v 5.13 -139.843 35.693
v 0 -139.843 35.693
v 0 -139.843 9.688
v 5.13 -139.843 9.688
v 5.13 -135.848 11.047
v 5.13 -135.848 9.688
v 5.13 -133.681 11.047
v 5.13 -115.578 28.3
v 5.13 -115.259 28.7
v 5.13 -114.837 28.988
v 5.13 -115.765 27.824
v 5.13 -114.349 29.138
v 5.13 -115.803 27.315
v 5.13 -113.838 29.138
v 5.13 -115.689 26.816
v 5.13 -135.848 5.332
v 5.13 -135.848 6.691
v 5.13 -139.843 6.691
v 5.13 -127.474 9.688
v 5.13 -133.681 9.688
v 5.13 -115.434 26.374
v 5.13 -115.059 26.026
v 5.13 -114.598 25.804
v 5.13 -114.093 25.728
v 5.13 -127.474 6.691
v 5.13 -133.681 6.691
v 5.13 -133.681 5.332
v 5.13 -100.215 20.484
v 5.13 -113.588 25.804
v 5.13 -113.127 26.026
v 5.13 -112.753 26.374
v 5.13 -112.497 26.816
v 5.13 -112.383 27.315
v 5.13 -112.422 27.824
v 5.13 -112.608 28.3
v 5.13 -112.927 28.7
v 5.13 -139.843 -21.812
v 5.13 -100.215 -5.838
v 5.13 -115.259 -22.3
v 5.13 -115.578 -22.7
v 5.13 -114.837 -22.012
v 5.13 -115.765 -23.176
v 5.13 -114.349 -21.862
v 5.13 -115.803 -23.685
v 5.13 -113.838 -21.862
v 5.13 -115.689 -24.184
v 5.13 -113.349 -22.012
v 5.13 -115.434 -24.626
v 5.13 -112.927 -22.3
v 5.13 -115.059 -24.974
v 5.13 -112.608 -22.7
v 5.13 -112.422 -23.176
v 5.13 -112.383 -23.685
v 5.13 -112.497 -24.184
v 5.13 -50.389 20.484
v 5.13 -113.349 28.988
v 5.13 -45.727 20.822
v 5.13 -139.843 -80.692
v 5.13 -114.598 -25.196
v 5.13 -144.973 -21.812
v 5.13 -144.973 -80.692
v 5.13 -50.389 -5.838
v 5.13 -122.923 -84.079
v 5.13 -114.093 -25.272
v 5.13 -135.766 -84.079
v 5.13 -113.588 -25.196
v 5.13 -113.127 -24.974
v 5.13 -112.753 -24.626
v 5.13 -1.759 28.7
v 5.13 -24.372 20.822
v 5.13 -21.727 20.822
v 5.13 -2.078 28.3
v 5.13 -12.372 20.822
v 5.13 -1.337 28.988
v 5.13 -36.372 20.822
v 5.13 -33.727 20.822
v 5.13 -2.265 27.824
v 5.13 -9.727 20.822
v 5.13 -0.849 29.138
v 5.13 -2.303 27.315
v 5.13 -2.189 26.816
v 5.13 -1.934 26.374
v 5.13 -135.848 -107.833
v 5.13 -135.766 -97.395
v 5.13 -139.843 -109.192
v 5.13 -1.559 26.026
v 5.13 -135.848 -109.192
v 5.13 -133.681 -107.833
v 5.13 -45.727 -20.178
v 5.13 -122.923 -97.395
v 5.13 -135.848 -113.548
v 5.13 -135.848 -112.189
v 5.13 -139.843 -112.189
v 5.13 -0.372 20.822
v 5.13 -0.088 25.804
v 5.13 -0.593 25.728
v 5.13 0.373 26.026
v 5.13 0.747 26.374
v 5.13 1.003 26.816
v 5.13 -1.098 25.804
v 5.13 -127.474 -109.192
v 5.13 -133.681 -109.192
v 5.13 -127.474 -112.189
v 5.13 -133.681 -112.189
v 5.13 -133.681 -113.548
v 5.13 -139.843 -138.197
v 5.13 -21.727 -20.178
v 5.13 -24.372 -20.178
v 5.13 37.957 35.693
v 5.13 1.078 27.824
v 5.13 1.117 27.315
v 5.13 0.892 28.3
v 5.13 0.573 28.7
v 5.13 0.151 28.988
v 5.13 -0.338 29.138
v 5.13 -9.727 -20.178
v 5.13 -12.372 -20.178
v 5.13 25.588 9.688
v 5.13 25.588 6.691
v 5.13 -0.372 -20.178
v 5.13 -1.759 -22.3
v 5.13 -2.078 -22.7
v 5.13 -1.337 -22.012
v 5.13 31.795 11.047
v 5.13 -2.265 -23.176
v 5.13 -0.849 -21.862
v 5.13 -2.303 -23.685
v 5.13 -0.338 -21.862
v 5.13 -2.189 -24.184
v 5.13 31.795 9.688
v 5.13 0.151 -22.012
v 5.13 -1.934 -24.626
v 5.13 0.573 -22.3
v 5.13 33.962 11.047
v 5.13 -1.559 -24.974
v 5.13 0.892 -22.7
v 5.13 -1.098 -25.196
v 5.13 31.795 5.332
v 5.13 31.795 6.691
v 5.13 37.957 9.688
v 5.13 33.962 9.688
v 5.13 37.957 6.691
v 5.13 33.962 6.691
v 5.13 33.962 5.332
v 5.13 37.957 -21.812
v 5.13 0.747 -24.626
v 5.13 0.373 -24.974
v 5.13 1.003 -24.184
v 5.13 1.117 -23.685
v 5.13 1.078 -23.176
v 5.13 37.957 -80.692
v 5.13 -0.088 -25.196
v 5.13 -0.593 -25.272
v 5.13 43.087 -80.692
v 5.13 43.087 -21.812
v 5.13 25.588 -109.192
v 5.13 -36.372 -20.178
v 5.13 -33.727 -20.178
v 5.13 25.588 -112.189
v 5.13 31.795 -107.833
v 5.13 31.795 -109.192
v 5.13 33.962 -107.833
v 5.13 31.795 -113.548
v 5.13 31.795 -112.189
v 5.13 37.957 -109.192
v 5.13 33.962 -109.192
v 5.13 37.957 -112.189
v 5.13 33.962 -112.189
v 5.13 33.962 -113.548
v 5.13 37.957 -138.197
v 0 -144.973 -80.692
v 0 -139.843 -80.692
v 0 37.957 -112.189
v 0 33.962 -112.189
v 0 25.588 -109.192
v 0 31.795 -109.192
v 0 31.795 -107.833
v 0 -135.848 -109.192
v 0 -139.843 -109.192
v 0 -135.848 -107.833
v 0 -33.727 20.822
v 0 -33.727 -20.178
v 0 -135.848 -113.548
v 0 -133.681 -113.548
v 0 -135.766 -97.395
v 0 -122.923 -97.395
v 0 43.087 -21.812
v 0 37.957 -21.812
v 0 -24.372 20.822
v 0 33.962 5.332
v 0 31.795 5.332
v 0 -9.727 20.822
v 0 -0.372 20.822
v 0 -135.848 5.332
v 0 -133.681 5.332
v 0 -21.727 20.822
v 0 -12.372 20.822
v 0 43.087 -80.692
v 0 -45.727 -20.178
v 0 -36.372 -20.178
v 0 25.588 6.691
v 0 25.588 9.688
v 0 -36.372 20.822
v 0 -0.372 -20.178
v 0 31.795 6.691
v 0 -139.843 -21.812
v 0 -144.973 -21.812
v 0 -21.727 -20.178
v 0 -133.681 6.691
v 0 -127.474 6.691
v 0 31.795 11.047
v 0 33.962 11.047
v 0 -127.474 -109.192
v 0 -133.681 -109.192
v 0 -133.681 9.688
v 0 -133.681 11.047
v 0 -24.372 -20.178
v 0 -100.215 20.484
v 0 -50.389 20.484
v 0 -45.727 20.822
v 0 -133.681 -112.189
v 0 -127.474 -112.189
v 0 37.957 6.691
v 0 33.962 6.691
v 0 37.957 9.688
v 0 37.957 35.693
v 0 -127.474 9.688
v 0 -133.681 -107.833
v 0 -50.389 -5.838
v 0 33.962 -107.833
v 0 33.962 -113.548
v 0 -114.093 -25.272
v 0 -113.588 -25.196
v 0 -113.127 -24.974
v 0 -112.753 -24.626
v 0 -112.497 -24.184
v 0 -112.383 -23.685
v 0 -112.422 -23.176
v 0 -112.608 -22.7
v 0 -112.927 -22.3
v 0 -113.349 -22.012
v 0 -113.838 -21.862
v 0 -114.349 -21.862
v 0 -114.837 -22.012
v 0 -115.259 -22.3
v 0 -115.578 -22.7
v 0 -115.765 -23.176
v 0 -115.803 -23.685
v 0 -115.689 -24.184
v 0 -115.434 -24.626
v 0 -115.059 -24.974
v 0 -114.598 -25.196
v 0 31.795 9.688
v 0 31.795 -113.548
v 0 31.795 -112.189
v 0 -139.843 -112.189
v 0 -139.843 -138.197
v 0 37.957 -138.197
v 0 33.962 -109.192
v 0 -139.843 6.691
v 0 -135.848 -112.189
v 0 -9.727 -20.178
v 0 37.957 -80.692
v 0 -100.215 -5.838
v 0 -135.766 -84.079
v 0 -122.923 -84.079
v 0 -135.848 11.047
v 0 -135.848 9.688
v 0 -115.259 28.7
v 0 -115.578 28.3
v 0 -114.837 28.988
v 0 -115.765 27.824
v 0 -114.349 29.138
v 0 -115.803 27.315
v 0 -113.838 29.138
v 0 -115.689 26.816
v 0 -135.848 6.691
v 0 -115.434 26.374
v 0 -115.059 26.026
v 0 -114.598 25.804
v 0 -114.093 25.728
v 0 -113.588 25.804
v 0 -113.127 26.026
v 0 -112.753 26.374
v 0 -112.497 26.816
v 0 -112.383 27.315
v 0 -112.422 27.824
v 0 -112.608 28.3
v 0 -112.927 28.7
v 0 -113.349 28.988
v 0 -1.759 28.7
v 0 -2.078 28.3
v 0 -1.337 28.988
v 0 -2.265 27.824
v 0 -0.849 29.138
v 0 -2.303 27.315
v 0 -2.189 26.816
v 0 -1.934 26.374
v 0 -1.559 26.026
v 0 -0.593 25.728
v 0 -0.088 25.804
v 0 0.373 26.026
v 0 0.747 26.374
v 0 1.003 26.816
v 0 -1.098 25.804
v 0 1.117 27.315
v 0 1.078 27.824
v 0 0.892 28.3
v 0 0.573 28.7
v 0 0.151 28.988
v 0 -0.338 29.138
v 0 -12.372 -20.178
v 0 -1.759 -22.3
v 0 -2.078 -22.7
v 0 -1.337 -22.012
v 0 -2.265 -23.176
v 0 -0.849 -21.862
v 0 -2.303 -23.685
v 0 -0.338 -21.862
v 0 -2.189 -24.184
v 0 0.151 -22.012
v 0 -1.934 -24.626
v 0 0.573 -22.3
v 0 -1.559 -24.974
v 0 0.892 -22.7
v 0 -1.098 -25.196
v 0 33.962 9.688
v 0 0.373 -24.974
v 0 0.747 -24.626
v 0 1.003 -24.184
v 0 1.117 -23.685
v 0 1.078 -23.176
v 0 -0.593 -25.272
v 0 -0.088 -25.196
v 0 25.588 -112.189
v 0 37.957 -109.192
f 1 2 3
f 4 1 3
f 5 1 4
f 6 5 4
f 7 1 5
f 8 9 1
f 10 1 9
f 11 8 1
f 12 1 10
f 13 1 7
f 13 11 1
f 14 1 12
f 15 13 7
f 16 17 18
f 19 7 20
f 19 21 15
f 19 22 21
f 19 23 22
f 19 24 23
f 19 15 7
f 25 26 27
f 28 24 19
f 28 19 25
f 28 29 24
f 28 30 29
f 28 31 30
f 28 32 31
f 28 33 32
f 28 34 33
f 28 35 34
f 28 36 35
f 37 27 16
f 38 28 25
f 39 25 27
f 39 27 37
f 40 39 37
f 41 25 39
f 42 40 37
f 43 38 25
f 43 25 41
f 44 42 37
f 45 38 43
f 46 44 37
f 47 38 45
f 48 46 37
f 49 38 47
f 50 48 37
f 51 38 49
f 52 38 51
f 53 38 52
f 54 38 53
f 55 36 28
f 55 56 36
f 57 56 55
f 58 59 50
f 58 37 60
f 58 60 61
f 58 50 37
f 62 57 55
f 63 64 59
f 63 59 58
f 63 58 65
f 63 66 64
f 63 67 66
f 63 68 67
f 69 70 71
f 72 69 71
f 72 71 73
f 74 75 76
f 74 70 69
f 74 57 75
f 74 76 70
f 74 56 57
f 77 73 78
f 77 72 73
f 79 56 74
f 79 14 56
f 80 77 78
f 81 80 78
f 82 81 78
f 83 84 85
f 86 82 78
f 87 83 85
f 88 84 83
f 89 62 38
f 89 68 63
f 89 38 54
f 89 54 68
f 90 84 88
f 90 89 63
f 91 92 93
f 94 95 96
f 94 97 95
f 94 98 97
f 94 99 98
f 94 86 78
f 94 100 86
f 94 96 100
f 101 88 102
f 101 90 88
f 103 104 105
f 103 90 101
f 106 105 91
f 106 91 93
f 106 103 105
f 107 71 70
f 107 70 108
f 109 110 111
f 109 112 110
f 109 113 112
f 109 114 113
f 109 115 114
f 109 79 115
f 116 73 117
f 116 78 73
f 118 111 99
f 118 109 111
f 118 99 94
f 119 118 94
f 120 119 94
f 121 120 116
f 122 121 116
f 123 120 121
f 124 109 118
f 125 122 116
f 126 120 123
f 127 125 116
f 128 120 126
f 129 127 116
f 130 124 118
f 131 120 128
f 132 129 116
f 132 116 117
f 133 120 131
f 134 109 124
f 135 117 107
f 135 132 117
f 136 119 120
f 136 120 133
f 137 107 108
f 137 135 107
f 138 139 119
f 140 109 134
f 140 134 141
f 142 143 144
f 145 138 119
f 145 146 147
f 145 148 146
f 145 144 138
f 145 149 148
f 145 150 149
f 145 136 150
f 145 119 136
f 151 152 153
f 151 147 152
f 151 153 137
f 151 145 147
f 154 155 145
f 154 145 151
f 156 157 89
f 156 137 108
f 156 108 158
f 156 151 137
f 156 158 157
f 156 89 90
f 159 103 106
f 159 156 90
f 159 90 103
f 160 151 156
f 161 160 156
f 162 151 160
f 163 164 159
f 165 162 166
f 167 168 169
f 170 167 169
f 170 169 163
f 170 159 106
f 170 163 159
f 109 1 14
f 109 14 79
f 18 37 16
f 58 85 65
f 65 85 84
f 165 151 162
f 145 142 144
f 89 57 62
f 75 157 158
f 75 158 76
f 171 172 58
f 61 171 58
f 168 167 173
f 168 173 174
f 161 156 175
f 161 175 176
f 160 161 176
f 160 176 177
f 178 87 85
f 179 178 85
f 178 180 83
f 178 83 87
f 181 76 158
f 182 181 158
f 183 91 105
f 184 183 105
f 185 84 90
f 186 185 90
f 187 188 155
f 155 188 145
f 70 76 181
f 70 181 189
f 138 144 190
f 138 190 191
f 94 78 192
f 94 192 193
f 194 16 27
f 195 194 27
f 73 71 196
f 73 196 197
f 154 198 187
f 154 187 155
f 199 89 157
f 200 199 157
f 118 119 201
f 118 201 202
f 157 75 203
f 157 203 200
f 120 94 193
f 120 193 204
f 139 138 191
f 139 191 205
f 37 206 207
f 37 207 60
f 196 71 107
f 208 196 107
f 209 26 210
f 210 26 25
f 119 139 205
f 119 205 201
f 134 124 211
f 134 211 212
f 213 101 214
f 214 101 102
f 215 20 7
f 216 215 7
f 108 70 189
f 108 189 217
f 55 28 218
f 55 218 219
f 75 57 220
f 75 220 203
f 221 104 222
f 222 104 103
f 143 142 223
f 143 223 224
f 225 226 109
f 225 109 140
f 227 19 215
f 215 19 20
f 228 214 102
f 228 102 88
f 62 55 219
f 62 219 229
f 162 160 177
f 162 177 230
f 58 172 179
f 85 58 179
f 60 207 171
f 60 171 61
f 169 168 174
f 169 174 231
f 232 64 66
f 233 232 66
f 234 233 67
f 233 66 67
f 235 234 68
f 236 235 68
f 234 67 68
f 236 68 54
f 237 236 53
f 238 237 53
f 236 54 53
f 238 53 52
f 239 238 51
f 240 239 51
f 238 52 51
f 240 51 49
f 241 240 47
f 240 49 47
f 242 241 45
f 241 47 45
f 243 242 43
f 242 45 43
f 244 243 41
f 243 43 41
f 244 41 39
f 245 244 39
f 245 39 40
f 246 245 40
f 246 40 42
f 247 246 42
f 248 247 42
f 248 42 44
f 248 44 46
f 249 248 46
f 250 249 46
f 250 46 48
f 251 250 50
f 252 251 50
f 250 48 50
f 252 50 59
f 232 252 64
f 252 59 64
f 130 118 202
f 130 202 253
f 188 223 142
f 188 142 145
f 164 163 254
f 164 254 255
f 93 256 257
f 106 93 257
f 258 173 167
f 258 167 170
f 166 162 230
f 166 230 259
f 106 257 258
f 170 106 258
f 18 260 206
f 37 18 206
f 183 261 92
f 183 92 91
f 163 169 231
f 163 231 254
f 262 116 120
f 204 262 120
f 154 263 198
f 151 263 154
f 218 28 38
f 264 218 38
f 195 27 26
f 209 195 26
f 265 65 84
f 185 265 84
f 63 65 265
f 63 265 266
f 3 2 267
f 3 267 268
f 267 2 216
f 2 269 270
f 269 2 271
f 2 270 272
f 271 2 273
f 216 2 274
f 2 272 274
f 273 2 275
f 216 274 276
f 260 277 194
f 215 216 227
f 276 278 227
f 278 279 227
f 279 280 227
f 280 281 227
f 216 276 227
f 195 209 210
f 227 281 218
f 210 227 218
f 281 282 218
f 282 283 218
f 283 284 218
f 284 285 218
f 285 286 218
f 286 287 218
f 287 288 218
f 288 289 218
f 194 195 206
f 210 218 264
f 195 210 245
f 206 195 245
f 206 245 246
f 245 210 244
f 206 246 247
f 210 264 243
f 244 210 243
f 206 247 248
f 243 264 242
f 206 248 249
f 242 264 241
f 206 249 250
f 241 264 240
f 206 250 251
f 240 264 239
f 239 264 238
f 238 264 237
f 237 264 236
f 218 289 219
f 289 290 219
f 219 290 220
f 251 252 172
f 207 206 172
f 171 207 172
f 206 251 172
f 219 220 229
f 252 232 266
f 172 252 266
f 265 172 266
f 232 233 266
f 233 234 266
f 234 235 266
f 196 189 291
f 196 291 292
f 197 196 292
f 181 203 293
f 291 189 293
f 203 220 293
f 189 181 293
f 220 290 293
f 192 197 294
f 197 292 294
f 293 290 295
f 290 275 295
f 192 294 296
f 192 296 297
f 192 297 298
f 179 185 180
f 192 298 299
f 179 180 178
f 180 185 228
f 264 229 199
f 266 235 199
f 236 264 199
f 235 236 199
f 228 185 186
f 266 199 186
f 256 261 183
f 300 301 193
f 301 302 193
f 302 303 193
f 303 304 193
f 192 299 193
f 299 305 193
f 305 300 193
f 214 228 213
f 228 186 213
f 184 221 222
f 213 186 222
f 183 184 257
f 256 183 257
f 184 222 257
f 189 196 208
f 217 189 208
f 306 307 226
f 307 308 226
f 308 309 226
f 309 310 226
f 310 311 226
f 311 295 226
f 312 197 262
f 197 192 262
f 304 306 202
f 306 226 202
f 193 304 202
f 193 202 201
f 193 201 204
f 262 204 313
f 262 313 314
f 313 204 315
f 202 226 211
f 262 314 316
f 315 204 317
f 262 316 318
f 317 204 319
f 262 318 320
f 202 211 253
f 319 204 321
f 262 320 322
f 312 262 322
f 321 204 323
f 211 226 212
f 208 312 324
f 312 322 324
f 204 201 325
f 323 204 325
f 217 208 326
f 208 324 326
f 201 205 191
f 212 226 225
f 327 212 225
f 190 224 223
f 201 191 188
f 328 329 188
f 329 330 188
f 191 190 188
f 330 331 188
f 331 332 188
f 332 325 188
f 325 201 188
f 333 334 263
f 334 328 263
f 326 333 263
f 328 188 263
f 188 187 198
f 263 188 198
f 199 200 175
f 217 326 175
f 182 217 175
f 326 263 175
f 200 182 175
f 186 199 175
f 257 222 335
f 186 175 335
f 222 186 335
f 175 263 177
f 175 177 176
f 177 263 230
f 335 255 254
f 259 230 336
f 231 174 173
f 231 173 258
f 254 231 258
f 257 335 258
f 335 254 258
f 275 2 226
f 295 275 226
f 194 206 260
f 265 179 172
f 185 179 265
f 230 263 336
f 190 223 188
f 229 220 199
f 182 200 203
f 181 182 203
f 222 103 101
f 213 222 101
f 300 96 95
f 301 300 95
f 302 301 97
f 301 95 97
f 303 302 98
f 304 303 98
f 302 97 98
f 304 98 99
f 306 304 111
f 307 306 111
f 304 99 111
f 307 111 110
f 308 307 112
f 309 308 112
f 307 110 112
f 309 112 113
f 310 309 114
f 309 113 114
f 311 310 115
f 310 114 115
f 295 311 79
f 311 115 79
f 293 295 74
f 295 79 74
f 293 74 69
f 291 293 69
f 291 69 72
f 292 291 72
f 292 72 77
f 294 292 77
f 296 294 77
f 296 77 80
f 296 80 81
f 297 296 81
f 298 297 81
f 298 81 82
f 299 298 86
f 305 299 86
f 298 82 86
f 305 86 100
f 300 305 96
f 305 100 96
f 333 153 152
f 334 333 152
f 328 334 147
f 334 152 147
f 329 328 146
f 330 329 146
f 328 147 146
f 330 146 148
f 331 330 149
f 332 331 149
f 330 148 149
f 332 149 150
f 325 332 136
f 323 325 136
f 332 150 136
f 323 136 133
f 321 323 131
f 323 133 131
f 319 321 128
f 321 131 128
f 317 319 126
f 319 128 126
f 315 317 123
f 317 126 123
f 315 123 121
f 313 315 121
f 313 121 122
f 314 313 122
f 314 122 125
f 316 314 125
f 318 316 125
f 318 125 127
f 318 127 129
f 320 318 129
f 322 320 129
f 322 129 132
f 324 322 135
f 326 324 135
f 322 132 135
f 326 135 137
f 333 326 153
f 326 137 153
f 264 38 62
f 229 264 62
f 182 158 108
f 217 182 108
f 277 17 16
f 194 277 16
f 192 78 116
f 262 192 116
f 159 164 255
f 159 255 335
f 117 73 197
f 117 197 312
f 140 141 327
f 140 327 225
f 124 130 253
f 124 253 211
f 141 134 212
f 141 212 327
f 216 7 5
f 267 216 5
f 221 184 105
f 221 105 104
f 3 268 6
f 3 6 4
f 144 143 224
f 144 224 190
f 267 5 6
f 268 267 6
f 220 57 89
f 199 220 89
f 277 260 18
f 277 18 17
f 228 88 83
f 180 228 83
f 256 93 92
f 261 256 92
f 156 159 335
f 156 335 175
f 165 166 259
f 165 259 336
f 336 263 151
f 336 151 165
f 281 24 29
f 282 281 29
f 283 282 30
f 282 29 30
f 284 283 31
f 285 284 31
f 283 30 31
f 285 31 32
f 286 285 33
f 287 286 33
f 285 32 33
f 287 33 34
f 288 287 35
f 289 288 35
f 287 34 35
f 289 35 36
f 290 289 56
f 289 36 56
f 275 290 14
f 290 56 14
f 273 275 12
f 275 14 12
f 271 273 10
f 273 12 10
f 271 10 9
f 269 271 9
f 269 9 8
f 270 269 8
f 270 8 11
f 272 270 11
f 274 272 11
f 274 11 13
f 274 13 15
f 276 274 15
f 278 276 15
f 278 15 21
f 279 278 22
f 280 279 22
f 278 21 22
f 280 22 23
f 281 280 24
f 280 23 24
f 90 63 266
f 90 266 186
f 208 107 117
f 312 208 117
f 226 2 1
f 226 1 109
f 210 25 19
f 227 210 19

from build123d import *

# Parameters (mm, degrees)
SKETCH1_W                  = 173.89
SKETCH1_H                  = 177.8
BOSS_EXTRUDE1_DEPTH        = 5.13
SKETCH6_W                  = 5.13
SKETCH6_H                  = 58.88
TEETH_DEPTH                = 5.13
T_SLOT_DEPTH               = 5.13
T_SLOT_PATTERN_COUNT       = 2
T_SLOT_PATTERN_PITCH       = 118.88
T_SLOT_BOTTOM_COPY_1_DEPTH = 5.13
SKETCH3_W                  = 26.322180797
SKETCH3_H                  = 49.826019937
POWER_PORT_DEPTH           = 5.13
POWER_SUPPLY_SCREWS_REACH  = 198.675
SKETCH7_R                  = 1.7145
SKETCH4_W                  = 41
SKETCH4_H                  = 9.354563129
FAN_VENT_DEPTH             = 5.13
LPATTERN3_COUNT            = 4
LPATTERN3_PITCH            = 12
SKETCH5_W                  = 13.315736025
SKETCH5_H                  = 12.842697729
USB_PORT_DEPTH             = 5.13
SKETCH11_W                 = 5.13
SKETCH11_H                 = 58.88
BOSS_EXTRUDE2_DEPTH        = 5.13
LPATTERN4_COUNT            = 2
LPATTERN4_PITCH            = 51
LPATTERN4_COUNT_DIR2       = 2
LPATTERN4_PITCH_DIR2       = 113.5


with BuildPart() as part:
    # Sketch1 → Boss-Extrude1 (new body)
    with BuildSketch(Plane(origin=(0, 0, 0), x_dir=(0, 0, -1), z_dir=(1, 0, 0))):
        with Locations((51.252197546, -50.943101868)):
            Rectangle(SKETCH1_W, SKETCH1_H)
    extrude(amount=BOSS_EXTRUDE1_DEPTH)

    # Sketch6 → teeth (add)
    with BuildSketch(Plane(origin=(0, 37.956898132, 0), x_dir=(1, 0, 0), z_dir=(0, 1, 0))):
        with Locations((2.565, 51.252197546)):
            Rectangle(SKETCH6_W, SKETCH6_H)
    extrude(amount=TEETH_DEPTH)

    # Sketch2 → t-slot (cut)
    with BuildSketch(Plane(origin=(5.13, 0, 0), x_dir=(0, 0, -1), z_dir=(1, 0, 0))):
        Polygon((-9.687802454, 37.956898132), (-6.690802454, 37.956898132), (-6.690802454, 33.961898132), (-5.331802454, 33.961898132), (-5.331802454, 31.794898132), (-6.690802454, 31.794898132), (-6.690802454, 25.587898132), (-9.687802454, 25.587898132), (-9.687802454, 31.794898132), (-11.046802454, 31.794898132), (-11.046802454, 33.961898132), (-9.687802454, 33.961898132), align=None)
    t_slot = extrude(amount=-T_SLOT_DEPTH, mode=Mode.SUBTRACT)

    # t-slot pattern: t-slot ×2
    with Locations(*[(0, 0, -i * T_SLOT_PATTERN_PITCH) for i in range(1, T_SLOT_PATTERN_COUNT)]):
        add(t_slot, mode=Mode.SUBTRACT)

    # t-slot bottom: t-slot across plane
    add(t_slot.mirror(Plane(origin=(0, -50.943101868, 0), x_dir=(0, 0, 1), z_dir=(0, -1, 0))), mode=Mode.SUBTRACT)

    # t-slot bottom copy 1 sketch → t-slot bottom copy 1 (cut)
    with BuildSketch(Plane(origin=(5.13, -101.886203737, -118.88), x_dir=(0, 0, -1), z_dir=(1, 0, 0))):
        Polygon((-9.687802454, -37.956898132), (-6.690802454, -37.956898132), (-6.690802454, -33.961898132), (-5.331802454, -33.961898132), (-5.331802454, -31.794898132), (-6.690802454, -31.794898132), (-6.690802454, -25.587898132), (-9.687802454, -25.587898132), (-9.687802454, -31.794898132), (-11.046802454, -31.794898132), (-11.046802454, -33.961898132), (-9.687802454, -33.961898132), align=None)
    extrude(amount=-T_SLOT_BOTTOM_COPY_1_DEPTH, mode=Mode.SUBTRACT)

    # Sketch3 → power port (cut)
    with BuildSketch(Plane(origin=(5.13, 0, 0), x_dir=(0, 0, -1), z_dir=(1, 0, 0))):
        with Locations((-7.323344752, -75.302440375)):
            Rectangle(SKETCH3_W, SKETCH3_H)
    extrude(amount=-POWER_PORT_DEPTH, mode=Mode.SUBTRACT)

    # Sketch7 → Power supply screws (cut, up to next)
    with BuildSketch(Plane(origin=(5.13, 0, 0), x_dir=(0, 0, -1), z_dir=(1, 0, 0)), mode=Mode.PRIVATE) as power_supply_screws_sk1:
        with Locations((-27.442802454, -0.593101868)):
            Circle(SKETCH7_R)
    power_supply_screws_tool1 = extrude(power_supply_screws_sk1.sketch, amount=-POWER_SUPPLY_SCREWS_REACH, mode=Mode.PRIVATE) & part.part
    power_supply_screws = power_supply_screws_tool1.solids().sort_by_distance((5.13, -0.593102, 27.442802))[0]
    add(power_supply_screws, mode=Mode.SUBTRACT)

    # Sketch4 → fan vent (cut)
    with BuildSketch(Plane(origin=(5.13, 0, 0), x_dir=(0, 0, -1), z_dir=(1, 0, 0))):
        with Locations((-0.321795885, -5.04966493)):
            Rectangle(SKETCH4_W, SKETCH4_H)
    fan_vent = extrude(amount=-FAN_VENT_DEPTH, mode=Mode.SUBTRACT)

    # LPattern3: fan vent ×4
    with Locations(*[(0, -i * LPATTERN3_PITCH, 0) for i in range(1, LPATTERN3_COUNT)]):
        add(fan_vent, mode=Mode.SUBTRACT)

    # Sketch5 → USB port (cut)
    with BuildSketch(Plane(origin=(5.13, 0, 0), x_dir=(0, 0, -1), z_dir=(1, 0, 0))):
        with Locations((90.737265655, -129.344754623)):
            Rectangle(SKETCH5_W, SKETCH5_H)
    extrude(amount=-USB_PORT_DEPTH, mode=Mode.SUBTRACT)

    # Sketch11 → Boss-Extrude2 (add)
    with BuildSketch(Plane.XZ.offset(139.843101868)):
        with Locations((2.565, -51.252197546)):
            Rectangle(SKETCH11_W, SKETCH11_H)
    extrude(amount=BOSS_EXTRUDE2_DEPTH)

    # LPattern4: Power supply screws 2 × 2
    with Locations(*[(0, -j * LPATTERN4_PITCH_DIR2, -i * LPATTERN4_PITCH) for i in range(LPATTERN4_COUNT) for j in range(LPATTERN4_COUNT_DIR2) if (i, j) != (0, 0)]):
        add(power_supply_screws, mode=Mode.SUBTRACT)


solid = part.part
